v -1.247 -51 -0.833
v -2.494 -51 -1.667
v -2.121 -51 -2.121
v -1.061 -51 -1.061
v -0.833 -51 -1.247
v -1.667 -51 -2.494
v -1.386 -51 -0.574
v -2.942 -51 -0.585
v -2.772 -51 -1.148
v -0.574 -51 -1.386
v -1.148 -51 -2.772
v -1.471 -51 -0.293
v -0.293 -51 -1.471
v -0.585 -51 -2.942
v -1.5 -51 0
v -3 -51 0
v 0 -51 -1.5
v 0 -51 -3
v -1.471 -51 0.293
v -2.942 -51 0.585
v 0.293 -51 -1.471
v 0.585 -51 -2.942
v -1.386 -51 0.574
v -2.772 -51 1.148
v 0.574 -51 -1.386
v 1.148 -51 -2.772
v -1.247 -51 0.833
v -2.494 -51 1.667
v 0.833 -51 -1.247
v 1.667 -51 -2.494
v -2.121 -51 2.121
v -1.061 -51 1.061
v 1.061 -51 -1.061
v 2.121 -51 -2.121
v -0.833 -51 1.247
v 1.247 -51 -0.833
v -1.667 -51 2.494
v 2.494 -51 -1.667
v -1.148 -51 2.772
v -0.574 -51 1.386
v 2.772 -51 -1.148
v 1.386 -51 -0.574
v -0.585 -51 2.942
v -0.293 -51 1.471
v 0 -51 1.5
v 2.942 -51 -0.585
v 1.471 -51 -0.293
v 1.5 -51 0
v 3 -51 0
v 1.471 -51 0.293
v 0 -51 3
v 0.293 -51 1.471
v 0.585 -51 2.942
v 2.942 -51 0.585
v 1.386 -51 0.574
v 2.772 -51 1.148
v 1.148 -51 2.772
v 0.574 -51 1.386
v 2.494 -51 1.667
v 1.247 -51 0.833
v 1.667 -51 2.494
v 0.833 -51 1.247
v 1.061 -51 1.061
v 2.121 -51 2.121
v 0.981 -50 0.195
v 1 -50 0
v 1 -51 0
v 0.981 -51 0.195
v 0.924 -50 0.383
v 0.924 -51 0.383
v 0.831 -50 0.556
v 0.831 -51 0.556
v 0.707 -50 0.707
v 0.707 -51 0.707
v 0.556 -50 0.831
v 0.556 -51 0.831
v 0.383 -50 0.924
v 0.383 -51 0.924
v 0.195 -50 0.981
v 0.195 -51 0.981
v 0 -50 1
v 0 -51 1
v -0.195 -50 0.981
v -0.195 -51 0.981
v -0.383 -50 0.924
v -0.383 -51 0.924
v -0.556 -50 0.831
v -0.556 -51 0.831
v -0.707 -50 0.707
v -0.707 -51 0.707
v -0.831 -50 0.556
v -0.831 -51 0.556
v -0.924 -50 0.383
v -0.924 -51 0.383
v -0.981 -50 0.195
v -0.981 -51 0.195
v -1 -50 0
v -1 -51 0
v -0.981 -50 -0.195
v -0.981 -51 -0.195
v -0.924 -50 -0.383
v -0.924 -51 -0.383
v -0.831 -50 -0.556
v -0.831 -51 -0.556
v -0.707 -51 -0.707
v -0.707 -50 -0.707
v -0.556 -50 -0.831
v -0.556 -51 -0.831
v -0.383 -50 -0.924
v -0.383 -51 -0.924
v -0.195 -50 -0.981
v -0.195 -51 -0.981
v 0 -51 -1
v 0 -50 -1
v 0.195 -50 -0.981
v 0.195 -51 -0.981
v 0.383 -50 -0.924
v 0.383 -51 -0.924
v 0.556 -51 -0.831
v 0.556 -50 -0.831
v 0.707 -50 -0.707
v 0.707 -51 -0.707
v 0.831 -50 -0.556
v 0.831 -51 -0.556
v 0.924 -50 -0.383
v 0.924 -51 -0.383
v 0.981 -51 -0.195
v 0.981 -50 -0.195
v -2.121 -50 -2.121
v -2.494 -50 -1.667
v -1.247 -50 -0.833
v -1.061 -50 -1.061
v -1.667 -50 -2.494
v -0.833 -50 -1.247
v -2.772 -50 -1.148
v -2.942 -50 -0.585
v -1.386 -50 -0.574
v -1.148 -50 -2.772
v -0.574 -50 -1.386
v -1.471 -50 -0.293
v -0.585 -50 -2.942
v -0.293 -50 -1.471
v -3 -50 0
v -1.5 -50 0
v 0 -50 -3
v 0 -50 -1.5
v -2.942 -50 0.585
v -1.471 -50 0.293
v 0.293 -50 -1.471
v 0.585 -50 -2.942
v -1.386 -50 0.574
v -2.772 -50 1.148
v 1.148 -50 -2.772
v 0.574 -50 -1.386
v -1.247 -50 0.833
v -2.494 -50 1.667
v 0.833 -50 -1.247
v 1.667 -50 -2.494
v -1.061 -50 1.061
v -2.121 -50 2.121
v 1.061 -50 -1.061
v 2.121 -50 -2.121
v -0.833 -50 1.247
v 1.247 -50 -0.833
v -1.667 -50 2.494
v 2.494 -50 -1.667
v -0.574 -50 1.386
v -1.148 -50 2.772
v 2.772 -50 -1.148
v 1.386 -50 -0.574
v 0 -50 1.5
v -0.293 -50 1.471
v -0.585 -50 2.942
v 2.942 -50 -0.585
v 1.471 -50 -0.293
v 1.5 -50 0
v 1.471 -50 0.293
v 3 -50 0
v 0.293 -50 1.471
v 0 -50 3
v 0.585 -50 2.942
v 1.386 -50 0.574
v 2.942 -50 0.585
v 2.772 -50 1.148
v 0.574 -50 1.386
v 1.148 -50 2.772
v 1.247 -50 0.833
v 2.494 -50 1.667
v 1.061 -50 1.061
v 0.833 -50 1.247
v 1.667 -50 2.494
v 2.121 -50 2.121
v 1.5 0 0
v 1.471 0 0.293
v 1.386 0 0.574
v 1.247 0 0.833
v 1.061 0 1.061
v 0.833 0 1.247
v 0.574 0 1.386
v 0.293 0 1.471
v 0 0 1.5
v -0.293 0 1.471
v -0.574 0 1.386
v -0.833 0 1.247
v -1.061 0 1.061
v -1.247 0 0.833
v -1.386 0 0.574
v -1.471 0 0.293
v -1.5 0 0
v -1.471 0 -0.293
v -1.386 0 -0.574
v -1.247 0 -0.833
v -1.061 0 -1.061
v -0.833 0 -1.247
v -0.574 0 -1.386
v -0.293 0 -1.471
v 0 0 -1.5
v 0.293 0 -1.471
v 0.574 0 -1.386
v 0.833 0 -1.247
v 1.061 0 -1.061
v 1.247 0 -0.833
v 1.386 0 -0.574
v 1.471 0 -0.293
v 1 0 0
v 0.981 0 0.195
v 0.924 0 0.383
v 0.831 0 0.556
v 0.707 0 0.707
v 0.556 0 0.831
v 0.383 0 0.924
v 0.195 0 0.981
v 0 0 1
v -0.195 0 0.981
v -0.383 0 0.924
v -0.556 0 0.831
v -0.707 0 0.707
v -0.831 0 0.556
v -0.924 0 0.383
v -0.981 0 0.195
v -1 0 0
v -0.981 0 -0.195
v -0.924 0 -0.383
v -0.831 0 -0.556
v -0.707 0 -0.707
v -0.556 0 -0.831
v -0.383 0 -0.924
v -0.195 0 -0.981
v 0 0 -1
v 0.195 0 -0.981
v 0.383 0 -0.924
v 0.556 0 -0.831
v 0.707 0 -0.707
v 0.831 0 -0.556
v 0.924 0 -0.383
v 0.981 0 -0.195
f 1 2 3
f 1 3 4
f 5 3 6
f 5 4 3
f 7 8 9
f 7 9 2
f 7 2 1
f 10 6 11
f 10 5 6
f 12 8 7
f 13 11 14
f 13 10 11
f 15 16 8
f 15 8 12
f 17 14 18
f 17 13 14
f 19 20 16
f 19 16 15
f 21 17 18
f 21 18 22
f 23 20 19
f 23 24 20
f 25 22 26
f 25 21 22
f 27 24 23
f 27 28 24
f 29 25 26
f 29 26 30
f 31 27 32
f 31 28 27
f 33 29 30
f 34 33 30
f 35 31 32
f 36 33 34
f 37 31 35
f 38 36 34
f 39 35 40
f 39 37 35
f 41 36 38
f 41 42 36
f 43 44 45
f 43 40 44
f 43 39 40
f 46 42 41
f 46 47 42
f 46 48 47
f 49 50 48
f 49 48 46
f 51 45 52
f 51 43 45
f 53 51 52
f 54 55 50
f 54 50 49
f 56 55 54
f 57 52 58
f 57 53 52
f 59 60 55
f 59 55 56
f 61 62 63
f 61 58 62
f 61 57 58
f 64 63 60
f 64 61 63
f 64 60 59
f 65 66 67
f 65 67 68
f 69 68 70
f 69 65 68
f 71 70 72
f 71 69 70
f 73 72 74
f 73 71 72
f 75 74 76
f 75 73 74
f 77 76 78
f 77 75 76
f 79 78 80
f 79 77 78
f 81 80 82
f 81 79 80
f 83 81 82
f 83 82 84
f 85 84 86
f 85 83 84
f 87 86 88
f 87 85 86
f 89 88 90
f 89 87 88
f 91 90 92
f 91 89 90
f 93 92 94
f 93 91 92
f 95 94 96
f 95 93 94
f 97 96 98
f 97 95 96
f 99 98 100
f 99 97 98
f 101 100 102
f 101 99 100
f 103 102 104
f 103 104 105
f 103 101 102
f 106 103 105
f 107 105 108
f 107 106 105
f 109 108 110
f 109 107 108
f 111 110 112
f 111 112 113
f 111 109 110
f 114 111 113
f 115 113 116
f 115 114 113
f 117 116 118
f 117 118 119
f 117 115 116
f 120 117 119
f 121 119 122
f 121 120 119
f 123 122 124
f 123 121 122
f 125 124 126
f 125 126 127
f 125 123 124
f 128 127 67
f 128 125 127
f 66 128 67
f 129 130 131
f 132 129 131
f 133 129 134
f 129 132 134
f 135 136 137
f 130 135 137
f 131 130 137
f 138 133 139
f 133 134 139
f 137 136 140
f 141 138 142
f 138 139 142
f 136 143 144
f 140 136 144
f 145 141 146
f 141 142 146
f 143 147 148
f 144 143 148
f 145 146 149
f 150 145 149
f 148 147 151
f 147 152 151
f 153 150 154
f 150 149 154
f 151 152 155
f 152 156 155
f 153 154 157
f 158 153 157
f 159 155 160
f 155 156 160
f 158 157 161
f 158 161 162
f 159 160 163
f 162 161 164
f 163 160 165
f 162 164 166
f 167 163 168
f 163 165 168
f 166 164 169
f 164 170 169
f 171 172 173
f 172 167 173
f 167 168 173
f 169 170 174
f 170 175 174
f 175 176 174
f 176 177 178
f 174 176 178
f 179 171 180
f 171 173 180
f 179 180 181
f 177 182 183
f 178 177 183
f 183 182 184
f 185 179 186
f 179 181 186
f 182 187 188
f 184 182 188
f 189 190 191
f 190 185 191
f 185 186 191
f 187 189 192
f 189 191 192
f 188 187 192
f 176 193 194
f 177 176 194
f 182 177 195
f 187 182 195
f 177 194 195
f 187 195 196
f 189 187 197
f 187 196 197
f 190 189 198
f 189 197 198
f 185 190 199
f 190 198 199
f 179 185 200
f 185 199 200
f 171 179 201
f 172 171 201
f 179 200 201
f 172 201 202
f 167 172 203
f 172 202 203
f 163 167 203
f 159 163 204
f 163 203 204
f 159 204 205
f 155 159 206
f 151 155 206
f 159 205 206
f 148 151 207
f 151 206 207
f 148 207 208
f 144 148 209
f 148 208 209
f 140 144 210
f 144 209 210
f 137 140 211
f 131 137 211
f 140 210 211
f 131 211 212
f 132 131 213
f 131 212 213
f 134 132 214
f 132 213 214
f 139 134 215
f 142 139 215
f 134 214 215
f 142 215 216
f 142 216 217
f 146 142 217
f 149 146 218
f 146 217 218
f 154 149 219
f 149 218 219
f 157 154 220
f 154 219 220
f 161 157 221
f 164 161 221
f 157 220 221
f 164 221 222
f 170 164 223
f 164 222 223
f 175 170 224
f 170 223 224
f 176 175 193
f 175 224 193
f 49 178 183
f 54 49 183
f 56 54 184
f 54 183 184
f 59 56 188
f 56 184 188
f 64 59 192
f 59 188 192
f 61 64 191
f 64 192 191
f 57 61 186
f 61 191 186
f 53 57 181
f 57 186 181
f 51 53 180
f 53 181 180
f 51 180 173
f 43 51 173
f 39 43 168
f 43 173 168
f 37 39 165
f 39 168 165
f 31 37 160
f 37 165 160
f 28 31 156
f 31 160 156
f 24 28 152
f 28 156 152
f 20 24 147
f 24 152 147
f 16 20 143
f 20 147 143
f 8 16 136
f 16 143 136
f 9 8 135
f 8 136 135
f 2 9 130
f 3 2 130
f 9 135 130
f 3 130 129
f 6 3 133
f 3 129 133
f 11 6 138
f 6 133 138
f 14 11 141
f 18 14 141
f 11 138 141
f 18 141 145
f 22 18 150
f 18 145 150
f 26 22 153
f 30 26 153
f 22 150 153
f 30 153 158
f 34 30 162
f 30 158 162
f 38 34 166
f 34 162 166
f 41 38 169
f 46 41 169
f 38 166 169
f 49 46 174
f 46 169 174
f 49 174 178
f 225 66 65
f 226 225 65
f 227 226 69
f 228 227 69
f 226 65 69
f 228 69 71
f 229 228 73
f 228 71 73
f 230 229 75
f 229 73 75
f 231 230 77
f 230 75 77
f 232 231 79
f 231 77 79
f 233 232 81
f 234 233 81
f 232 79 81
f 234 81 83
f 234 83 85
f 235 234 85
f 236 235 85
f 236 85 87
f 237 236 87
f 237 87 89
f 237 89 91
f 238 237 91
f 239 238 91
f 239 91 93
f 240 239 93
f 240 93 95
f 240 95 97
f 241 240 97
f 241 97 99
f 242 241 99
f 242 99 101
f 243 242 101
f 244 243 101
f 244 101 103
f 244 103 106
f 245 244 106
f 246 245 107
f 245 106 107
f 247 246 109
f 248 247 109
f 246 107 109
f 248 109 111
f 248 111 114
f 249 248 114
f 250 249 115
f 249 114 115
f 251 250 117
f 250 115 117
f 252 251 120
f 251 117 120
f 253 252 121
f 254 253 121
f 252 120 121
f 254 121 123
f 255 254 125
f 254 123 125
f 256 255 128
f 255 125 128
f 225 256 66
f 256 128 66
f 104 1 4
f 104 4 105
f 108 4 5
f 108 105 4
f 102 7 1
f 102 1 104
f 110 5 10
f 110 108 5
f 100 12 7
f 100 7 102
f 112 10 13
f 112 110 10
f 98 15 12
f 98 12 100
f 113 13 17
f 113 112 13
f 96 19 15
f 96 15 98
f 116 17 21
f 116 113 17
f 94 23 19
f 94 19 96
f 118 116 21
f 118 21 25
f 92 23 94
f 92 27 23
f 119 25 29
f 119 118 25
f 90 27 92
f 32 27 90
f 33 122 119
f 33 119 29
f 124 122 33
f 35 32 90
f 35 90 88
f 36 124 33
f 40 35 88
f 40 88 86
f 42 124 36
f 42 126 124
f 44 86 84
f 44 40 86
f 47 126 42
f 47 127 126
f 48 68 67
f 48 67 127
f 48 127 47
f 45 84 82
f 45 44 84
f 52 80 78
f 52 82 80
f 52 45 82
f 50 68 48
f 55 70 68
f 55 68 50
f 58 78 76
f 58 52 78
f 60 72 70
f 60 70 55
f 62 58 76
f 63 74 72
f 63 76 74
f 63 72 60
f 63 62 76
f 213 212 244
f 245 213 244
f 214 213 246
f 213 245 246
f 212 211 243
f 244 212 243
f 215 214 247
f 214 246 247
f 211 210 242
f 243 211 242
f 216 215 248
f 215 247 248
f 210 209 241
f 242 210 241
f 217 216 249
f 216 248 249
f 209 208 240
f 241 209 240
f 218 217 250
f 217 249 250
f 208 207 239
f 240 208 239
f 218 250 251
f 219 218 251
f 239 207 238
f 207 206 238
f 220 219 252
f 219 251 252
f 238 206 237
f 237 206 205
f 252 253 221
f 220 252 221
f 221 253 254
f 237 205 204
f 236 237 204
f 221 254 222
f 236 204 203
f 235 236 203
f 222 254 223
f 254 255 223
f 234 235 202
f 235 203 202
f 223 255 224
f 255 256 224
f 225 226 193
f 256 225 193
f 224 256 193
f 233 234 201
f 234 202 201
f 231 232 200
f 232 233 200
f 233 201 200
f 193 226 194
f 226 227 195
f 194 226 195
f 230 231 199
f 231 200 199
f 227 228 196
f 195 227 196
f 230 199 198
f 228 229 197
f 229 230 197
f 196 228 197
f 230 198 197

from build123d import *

# Parameters (mm, degrees)
F0_R     = 1.5
F1_DEPTH = 50
F2_R     = 1
F3_DEPTH = 50.001
F4_R     = 1.5
F4_R_2   = 1
F5_R     = 3
F5_R_2   = 1.5
F6_DEPTH = 1


with BuildPart() as f1:
    # F0 (on Front) → F1 (new body)
    with BuildSketch(Plane.XZ):
        Circle(F0_R)
    extrude(amount=F1_DEPTH)

    # F2 (on face) → F3 (cut, through all)
    with BuildSketch(Plane.XZ.offset(50)):
        Circle(F2_R)
    extrude(amount=-F3_DEPTH, mode=Mode.SUBTRACT)

    # F4 (on face) + F5 (on face) → F6 (join)
    with BuildSketch(Plane.XZ.offset(50)):
        Circle(F4_R)
        Circle(F4_R_2, mode=Mode.SUBTRACT)
    with BuildSketch(Plane.XZ.offset(50)):
        Circle(F5_R)
        Circle(F5_R_2, mode=Mode.SUBTRACT)
    extrude(amount=F6_DEPTH)


solid = f1.part
